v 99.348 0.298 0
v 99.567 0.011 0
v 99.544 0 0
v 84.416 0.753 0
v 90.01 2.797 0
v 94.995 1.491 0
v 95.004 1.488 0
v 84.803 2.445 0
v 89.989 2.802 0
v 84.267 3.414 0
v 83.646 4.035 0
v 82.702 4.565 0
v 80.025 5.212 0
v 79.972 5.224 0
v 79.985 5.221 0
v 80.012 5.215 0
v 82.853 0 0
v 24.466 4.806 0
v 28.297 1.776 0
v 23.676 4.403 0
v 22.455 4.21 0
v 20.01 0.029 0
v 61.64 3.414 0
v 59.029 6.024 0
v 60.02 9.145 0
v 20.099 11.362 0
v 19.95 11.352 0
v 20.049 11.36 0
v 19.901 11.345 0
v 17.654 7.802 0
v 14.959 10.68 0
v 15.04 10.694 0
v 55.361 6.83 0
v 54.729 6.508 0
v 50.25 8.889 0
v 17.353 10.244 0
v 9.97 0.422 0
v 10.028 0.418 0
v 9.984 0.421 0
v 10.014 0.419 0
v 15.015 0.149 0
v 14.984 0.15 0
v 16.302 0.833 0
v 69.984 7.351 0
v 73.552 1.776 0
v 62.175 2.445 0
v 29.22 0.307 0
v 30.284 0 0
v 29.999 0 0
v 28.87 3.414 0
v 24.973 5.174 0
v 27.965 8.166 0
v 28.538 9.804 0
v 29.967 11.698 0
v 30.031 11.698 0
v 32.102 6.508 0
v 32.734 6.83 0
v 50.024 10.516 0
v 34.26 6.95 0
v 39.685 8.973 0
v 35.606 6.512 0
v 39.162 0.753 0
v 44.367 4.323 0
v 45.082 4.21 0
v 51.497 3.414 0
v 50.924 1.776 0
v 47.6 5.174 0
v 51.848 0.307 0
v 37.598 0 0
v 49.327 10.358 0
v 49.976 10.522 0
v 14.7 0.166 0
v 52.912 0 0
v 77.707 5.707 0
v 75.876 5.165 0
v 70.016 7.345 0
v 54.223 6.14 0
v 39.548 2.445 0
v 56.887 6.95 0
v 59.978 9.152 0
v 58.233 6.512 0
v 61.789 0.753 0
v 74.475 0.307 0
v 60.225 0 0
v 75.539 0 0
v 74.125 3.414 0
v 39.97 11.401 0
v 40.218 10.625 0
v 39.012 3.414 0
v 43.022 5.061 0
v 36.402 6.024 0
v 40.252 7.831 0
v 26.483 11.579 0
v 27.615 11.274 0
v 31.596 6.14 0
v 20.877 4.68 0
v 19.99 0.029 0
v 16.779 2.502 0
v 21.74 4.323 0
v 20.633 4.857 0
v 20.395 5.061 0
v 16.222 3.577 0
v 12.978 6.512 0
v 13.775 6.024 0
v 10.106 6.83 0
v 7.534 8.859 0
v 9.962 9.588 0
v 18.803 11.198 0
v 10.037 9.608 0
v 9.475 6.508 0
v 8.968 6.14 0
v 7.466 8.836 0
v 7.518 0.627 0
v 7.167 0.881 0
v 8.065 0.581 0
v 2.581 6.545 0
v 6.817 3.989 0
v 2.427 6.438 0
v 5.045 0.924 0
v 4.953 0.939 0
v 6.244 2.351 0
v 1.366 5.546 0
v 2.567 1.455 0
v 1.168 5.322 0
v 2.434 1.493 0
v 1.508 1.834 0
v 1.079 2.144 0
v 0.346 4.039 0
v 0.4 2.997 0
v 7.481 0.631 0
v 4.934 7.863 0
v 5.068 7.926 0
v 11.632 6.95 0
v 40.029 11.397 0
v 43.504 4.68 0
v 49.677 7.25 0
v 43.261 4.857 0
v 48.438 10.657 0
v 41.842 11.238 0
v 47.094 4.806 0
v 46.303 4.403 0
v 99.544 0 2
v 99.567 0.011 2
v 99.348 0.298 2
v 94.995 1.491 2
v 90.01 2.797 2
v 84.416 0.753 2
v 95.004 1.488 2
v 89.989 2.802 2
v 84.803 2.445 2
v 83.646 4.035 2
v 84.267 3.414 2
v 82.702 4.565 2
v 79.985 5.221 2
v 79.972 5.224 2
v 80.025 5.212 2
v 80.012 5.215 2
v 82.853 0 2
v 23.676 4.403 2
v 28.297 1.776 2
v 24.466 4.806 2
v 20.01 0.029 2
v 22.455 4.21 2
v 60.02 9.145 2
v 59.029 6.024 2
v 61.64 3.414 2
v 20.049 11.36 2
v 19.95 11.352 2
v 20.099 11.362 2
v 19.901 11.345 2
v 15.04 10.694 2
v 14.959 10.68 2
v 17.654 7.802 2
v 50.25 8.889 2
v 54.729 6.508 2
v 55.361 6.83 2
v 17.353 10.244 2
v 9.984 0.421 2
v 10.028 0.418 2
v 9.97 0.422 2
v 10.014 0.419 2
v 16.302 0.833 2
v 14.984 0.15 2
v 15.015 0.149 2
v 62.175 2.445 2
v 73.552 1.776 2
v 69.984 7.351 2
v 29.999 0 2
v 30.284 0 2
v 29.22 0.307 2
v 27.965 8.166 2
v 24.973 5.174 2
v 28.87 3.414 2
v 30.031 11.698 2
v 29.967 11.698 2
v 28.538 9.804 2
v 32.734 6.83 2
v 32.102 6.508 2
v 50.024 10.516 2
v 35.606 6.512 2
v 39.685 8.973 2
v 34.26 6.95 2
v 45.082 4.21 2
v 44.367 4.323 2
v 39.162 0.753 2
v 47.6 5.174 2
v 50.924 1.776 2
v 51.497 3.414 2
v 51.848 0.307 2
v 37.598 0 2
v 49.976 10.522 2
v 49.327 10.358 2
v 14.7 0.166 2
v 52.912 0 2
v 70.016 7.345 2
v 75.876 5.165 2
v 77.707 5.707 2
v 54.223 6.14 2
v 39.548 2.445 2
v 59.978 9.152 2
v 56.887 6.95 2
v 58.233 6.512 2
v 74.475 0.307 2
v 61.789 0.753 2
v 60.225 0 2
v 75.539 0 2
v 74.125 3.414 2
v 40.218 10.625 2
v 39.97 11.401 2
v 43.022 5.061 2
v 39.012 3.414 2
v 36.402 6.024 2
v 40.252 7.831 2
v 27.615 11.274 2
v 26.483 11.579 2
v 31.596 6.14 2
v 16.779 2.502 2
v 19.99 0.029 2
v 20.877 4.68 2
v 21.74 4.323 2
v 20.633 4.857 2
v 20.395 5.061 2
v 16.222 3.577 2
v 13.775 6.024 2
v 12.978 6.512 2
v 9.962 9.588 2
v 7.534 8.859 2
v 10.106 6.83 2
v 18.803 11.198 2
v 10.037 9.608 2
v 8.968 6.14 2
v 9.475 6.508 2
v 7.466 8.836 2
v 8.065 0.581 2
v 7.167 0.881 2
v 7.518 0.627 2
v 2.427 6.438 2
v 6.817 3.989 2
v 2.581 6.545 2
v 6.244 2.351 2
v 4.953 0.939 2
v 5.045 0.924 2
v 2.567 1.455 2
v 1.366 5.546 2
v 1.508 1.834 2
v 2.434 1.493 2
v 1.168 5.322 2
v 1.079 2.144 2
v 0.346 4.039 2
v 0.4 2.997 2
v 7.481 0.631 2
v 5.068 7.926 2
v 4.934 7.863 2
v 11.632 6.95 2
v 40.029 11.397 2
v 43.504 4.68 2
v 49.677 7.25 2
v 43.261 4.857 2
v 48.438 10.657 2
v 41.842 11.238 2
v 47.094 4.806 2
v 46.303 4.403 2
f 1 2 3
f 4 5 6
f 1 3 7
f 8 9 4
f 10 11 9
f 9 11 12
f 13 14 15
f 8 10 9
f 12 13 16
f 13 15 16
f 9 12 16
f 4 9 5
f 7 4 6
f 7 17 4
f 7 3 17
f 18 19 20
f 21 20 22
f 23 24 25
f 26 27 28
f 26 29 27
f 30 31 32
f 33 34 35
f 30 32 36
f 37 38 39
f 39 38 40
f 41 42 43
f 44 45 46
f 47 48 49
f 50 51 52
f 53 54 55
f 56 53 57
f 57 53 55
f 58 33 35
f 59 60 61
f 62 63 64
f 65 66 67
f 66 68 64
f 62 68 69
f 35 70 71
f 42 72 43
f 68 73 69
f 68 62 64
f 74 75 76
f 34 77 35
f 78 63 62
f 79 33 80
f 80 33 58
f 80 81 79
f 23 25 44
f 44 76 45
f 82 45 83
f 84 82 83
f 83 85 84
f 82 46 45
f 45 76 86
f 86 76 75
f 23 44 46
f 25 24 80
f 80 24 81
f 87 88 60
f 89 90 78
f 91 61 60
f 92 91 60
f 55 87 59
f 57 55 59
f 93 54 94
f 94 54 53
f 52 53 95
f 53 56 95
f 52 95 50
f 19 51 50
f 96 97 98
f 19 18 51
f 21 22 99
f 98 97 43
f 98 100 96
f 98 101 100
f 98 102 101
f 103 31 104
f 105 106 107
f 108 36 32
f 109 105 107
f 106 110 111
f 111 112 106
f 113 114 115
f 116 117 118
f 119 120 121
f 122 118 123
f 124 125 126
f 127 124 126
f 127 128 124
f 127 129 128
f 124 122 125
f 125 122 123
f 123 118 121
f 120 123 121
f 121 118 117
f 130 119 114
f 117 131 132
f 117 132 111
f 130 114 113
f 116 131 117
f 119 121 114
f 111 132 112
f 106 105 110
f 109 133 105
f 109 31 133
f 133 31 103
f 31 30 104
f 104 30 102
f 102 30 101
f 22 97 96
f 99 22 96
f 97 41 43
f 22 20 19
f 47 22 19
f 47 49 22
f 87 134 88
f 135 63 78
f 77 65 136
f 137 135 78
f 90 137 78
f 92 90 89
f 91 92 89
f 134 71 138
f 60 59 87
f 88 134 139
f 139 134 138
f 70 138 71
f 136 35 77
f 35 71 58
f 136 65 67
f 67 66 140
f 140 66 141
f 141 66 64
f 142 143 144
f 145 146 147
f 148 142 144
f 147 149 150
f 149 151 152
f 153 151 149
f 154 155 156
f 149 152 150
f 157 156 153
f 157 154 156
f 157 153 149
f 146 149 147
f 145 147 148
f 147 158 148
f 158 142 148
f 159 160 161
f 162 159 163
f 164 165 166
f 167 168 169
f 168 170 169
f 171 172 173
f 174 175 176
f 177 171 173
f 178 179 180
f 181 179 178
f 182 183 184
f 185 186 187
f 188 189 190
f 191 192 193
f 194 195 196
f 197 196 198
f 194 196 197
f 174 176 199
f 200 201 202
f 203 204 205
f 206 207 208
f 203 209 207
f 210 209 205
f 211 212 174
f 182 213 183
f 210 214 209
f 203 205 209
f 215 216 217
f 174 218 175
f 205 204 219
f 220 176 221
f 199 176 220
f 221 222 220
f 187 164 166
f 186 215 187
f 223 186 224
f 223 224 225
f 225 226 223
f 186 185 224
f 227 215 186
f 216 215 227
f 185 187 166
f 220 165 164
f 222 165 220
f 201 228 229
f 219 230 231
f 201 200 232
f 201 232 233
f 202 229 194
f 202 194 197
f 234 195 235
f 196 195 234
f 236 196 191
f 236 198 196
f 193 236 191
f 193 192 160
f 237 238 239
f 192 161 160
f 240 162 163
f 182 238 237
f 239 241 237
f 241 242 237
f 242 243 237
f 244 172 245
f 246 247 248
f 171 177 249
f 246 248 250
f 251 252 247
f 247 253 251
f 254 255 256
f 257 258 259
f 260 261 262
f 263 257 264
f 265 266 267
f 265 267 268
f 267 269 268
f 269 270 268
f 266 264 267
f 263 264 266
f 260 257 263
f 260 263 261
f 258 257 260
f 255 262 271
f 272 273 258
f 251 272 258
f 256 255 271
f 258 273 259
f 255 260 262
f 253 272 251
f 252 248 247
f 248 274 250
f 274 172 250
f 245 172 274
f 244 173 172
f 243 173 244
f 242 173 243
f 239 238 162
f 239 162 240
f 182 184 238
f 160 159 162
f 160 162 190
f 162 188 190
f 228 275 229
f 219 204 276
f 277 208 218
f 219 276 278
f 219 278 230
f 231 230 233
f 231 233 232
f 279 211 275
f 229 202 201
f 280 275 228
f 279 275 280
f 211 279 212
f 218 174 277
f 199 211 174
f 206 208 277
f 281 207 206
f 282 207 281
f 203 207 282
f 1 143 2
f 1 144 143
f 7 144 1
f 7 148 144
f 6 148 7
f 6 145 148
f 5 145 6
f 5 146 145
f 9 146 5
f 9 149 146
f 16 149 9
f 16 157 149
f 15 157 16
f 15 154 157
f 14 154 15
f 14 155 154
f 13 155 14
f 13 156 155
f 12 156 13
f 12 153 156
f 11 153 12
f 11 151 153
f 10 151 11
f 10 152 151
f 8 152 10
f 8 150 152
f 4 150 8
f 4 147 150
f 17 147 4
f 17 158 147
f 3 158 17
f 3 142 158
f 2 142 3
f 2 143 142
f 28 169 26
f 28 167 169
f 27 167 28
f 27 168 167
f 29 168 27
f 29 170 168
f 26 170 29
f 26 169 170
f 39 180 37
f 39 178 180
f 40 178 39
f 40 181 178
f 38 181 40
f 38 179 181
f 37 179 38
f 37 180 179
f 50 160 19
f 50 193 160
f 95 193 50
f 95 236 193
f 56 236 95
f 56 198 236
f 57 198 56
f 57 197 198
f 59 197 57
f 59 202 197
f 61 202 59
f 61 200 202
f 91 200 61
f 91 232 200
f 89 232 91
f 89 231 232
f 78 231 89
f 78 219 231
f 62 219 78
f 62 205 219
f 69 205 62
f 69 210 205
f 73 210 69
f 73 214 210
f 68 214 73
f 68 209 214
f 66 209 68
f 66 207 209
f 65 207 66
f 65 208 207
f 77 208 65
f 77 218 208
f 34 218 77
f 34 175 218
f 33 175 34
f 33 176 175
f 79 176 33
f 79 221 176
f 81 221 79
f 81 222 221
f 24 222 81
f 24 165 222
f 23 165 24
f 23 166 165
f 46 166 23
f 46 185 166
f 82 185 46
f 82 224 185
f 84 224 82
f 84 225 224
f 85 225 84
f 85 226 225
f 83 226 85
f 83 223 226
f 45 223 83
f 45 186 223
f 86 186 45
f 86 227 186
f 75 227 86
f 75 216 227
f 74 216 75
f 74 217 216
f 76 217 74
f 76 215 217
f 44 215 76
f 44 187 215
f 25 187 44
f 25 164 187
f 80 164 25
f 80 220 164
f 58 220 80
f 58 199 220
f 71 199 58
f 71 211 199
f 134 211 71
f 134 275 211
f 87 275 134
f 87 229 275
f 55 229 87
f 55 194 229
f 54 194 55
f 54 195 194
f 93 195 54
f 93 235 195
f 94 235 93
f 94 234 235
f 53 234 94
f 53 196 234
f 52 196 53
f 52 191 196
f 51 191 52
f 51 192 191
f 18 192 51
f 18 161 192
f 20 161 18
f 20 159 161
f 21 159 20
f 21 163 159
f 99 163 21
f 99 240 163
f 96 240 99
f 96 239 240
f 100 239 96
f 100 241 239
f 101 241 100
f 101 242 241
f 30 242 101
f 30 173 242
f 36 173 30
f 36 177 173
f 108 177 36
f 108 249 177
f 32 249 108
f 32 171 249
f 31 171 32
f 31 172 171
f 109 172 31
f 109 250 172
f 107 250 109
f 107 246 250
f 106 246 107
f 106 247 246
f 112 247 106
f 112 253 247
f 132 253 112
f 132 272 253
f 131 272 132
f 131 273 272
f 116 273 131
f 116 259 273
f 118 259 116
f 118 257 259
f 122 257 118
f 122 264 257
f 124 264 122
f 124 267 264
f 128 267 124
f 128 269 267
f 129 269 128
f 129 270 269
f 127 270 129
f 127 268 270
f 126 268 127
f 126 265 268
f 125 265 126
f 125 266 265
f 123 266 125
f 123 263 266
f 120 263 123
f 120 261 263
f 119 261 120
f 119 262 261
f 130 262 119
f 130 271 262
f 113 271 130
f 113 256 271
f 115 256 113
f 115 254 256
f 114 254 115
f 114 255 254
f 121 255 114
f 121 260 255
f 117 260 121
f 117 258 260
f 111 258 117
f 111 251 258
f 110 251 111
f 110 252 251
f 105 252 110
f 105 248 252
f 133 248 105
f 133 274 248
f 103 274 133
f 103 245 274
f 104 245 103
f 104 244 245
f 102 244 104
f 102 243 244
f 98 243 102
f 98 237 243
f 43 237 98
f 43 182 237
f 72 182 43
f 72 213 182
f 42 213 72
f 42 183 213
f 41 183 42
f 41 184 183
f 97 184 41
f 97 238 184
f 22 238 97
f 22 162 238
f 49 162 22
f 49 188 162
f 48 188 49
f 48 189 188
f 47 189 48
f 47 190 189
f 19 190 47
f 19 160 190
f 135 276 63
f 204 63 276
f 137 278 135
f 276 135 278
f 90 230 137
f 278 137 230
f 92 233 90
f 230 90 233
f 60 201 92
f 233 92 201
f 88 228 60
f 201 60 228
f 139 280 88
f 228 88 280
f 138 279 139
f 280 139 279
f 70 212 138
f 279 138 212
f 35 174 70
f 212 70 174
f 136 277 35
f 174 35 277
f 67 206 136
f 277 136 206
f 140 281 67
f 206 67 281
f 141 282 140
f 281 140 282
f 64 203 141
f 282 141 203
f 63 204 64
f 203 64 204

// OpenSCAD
use <Round-Anything-master/roundAnythingExamples.scad>

// Clark-Y Airfoil Coordinates
airfoil_points = [
    // --- Upper surface: trailing edge to leading edge ---
    [1.0000,  0.0012],
    [0.9500,  0.0149],
    [0.9000,  0.0280],
    [0.8000,  0.0522],
    [0.7000,  0.0735],
    [0.6000,  0.0915],
    [0.5000,  0.1052],
    [0.4000,  0.1140],
    [0.3000,  0.1170],  // max thickness
    [0.2000,  0.1136],
    [0.1500,  0.1069],
    [0.1000,  0.0960],
    [0.0750,  0.0885],
    [0.0500,  0.0790],
    [0.0250,  0.0650],
    [0.0125,  0.0545],
    [0.0000,  0.0350],  // leading edge

    // --- Lower surface: leading edge to trailing edge ---
    // Flat bottom begins at ~x=0.30; forward of that, small positive camber
    [0.0125,  0.0193],
    [0.0250,  0.0147],
    [0.0500,  0.0093],
    [0.0750,  0.0063],
    [0.1000,  0.0042],
    [0.1500,  0.0015],
    [0.2000,  0.0003],
    [0.3000,  0.0000],  // flat bottom begins here
    [0.4000,  0.0000],
    [0.5000,  0.0000],
    [0.6000,  0.0000],
    [0.7000,  0.0000],
    [0.8000,  0.0000],
    [0.9000,  0.0000],
    [0.9500,  0.0000],
    [1.0000,  0.0000],  // trailing edge (flat bottom meets upper)
];

chord = 100;

linear_extrude(height = 2) {
shell2d(0,-2) {
    intersection() {
scale([chord, chord, 1]) {
            polygon(points = airfoil_points);
            }
        }
gridpattern(iter=12);
    }
}
